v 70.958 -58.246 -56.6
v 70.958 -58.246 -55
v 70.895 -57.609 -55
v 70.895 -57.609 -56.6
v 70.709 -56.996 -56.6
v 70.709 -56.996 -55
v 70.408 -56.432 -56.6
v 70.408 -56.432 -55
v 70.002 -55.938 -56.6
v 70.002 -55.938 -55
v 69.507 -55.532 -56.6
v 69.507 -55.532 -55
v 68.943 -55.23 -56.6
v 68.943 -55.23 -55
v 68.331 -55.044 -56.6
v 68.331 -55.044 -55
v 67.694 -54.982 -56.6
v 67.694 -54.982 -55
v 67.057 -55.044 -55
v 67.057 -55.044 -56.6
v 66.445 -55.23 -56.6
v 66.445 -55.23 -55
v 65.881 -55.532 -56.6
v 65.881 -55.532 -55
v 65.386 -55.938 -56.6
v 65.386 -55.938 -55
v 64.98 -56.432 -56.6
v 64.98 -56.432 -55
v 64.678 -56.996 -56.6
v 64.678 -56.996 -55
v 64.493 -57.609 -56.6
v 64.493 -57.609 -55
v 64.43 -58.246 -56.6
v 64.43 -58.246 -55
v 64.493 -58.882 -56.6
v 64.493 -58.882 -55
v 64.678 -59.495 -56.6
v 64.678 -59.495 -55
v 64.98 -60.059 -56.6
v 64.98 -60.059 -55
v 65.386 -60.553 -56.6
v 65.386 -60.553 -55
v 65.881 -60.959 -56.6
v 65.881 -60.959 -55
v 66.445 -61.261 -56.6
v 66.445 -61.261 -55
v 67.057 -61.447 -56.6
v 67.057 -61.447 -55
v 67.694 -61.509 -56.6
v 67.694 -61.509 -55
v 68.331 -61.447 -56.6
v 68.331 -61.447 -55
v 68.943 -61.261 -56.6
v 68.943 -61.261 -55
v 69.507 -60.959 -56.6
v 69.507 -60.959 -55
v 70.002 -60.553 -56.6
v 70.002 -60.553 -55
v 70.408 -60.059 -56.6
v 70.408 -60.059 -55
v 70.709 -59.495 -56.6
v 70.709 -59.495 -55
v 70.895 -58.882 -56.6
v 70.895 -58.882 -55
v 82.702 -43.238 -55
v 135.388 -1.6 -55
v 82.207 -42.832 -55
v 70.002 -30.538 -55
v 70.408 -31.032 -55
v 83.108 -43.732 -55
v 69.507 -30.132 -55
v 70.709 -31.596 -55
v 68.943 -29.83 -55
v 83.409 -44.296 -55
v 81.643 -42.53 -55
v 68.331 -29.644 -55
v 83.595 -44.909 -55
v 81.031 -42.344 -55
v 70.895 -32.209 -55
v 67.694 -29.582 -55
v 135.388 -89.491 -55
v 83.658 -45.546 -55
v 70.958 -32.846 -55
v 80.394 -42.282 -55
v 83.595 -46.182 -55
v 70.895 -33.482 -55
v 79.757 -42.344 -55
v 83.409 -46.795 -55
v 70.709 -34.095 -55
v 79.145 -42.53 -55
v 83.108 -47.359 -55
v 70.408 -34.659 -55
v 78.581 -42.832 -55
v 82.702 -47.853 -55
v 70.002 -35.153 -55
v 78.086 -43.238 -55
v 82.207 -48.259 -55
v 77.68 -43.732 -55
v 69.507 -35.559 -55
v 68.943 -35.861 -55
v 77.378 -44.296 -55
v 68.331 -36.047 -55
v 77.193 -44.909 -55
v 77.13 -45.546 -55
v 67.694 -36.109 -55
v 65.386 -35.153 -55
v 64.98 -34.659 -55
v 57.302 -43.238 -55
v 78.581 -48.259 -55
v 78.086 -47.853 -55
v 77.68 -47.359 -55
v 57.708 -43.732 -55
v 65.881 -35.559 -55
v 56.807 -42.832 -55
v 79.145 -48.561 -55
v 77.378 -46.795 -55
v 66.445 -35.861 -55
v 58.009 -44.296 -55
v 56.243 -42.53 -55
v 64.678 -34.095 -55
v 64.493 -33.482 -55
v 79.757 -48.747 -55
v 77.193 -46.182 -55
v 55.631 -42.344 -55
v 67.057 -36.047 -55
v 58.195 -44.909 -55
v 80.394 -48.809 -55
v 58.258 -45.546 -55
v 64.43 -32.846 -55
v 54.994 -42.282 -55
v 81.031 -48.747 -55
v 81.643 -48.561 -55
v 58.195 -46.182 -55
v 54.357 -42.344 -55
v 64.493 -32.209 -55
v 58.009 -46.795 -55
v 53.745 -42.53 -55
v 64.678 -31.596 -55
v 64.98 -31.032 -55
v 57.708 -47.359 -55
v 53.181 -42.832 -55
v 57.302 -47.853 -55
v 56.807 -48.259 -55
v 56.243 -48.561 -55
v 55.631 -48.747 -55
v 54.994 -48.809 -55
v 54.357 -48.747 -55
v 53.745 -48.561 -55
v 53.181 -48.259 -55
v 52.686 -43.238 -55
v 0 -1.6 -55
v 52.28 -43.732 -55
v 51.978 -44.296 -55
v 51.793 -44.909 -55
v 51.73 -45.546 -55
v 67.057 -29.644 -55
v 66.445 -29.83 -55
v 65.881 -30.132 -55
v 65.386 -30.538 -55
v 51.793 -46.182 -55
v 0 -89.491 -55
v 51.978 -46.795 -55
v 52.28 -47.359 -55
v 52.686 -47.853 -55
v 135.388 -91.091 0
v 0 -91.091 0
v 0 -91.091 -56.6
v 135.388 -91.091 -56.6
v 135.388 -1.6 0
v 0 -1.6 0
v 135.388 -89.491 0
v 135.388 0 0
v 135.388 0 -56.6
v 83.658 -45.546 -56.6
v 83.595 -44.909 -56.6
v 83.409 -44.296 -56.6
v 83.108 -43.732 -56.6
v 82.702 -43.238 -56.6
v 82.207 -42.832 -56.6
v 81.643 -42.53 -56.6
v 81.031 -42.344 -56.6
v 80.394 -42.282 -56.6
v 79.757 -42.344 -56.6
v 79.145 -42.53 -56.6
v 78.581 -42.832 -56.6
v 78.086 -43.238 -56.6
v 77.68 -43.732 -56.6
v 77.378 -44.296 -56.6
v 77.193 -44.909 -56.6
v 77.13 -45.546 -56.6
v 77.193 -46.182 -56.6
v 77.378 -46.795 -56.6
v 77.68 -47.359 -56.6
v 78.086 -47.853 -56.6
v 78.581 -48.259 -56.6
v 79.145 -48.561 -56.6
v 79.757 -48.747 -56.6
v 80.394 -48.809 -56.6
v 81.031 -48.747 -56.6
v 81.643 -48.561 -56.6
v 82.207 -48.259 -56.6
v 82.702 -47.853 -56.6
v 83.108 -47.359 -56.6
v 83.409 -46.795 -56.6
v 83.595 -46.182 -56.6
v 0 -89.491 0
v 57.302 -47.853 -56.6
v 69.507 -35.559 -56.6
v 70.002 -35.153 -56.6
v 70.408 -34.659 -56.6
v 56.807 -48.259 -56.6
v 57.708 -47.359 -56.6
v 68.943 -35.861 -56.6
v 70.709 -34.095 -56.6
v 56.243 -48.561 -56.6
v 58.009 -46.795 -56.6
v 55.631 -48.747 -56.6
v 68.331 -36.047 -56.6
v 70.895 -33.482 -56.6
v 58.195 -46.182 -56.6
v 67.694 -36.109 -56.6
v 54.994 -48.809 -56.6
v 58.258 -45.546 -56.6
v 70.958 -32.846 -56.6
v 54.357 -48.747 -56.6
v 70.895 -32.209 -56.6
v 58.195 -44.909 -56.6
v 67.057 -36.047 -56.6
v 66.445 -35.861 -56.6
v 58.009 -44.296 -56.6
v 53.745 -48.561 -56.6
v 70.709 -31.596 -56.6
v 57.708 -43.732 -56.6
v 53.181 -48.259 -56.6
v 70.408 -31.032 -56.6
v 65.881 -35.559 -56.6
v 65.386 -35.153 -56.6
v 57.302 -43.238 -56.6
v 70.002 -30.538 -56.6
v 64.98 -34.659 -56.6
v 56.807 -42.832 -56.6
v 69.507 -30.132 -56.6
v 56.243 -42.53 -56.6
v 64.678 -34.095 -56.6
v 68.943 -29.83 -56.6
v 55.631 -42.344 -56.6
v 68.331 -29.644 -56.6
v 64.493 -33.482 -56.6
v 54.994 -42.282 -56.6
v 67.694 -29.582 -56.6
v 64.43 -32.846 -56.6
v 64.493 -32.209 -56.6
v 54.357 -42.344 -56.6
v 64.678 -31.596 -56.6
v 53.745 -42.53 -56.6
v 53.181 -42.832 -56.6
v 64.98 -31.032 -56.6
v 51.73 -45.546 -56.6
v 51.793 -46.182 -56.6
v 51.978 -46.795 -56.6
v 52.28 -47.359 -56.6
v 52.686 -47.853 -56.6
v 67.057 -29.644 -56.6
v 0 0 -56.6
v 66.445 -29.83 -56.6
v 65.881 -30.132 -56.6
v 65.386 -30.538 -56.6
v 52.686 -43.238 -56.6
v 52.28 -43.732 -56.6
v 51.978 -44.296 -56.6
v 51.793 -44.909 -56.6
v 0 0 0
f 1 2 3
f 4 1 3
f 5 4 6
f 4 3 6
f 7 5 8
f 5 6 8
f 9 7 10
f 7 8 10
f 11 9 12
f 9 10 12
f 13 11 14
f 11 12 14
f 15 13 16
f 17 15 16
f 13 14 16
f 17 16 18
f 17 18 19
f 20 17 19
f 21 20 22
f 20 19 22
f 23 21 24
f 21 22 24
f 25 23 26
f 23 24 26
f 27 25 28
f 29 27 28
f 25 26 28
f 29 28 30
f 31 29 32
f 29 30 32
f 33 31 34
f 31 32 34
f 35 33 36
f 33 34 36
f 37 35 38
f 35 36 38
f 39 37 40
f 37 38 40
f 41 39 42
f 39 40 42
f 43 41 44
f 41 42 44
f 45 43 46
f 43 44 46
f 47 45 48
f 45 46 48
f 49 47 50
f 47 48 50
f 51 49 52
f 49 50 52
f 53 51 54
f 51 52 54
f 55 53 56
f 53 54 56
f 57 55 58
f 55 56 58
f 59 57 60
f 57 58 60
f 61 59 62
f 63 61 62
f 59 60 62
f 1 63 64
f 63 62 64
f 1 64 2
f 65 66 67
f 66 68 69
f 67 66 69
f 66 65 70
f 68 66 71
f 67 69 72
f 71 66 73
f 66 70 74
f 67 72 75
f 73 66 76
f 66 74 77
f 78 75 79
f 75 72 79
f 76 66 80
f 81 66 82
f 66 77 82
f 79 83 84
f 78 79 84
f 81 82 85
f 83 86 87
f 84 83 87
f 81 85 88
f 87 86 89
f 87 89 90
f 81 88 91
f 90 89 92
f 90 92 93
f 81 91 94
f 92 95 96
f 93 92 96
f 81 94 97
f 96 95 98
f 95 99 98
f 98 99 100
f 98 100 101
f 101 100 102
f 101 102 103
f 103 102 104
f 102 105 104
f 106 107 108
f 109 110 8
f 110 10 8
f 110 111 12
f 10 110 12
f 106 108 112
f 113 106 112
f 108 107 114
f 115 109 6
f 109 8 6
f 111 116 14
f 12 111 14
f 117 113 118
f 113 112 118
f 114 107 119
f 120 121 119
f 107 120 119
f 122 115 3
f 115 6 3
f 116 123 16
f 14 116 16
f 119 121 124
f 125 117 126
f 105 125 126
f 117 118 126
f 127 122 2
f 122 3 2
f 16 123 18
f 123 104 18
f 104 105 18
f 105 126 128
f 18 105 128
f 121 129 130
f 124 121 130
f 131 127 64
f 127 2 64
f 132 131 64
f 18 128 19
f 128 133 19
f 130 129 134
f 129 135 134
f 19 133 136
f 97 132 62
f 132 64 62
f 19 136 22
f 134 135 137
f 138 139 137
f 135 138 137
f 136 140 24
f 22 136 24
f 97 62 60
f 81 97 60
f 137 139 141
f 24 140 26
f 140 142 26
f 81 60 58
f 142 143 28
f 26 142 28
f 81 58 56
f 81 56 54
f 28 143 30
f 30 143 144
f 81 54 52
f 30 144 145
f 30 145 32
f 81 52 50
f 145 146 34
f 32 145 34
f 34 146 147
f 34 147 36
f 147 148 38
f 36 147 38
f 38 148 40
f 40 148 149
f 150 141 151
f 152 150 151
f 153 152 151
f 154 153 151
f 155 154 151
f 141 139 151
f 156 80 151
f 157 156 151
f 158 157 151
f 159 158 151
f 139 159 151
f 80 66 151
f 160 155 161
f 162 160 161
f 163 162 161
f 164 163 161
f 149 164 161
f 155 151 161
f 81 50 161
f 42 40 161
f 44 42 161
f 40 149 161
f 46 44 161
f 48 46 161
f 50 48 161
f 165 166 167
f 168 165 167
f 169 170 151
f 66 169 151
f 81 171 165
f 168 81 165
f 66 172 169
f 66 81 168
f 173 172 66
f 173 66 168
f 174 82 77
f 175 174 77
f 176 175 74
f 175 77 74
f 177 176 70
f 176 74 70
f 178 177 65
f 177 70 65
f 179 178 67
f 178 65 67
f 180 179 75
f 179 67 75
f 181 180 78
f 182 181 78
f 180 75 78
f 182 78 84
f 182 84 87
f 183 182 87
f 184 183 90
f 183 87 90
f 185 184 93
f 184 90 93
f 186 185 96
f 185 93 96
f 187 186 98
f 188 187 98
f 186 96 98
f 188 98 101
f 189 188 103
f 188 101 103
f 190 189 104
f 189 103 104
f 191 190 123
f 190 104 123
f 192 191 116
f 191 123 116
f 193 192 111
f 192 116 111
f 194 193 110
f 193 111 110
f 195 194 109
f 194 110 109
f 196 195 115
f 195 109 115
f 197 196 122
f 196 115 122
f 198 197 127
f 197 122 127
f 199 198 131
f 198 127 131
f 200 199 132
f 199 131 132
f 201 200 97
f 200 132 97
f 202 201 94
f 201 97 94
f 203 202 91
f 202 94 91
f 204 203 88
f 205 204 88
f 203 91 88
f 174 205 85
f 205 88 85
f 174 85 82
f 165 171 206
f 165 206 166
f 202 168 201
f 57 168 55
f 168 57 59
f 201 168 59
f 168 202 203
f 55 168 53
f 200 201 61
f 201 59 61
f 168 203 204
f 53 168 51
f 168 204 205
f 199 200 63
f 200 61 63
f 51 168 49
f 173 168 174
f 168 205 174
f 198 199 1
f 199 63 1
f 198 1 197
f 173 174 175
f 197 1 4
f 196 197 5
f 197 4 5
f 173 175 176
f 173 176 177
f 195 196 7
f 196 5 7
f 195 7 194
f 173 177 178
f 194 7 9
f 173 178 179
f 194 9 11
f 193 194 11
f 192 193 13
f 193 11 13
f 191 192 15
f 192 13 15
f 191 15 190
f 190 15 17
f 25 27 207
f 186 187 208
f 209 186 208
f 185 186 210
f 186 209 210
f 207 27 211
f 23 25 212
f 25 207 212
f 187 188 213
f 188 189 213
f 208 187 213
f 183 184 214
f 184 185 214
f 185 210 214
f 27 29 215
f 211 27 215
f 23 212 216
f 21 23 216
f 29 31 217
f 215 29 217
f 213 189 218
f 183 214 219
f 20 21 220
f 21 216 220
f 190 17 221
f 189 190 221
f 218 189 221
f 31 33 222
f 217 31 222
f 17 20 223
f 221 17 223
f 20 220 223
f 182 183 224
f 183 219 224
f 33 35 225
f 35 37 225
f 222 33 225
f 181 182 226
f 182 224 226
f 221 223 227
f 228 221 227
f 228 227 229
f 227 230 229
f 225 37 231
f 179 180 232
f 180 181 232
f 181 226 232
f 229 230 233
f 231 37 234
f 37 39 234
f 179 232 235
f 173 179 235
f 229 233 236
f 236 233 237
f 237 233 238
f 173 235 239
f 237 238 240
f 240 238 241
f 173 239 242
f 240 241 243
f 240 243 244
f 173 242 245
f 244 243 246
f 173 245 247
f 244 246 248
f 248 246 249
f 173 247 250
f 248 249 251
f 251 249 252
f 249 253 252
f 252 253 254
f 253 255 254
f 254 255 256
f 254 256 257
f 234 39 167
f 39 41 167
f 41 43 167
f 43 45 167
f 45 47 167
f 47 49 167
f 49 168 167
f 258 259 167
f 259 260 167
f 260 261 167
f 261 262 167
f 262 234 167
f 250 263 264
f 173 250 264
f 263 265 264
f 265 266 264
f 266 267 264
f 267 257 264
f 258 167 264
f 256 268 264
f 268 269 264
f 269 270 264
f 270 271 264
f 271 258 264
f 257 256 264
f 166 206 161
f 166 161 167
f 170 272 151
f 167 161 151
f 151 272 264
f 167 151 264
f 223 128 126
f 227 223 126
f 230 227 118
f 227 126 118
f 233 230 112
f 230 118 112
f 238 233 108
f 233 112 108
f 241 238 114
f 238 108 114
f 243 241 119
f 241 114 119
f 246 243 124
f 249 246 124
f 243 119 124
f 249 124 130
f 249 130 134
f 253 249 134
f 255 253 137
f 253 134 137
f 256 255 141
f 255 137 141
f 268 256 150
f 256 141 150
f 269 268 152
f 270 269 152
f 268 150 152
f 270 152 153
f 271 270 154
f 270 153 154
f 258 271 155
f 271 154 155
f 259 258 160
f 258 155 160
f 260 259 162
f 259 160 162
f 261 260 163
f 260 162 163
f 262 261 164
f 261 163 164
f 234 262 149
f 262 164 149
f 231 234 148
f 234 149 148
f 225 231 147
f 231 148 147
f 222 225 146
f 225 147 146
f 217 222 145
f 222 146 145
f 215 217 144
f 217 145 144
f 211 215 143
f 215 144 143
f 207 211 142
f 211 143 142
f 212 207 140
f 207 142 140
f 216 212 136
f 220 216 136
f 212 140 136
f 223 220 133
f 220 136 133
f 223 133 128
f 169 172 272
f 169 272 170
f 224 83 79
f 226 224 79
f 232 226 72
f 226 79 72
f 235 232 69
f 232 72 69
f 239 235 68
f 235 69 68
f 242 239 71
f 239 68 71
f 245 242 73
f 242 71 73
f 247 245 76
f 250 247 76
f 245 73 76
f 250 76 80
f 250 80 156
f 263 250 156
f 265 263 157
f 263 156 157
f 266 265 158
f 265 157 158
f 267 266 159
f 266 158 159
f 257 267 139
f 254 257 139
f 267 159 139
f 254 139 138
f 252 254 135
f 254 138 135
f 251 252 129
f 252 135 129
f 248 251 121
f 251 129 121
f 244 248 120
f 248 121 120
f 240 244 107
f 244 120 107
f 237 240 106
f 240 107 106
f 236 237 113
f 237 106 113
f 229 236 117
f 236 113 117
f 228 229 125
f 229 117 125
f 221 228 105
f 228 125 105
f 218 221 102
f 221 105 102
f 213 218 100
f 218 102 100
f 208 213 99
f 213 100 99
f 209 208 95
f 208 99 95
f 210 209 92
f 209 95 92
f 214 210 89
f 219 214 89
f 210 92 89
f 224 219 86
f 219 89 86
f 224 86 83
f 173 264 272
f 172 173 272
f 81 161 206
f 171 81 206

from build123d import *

# Parameters (mm, degrees)
BOSS_EXTRUDE1_DEPTH = 135.3879
SKETCH2_R           = 3.2639
CUT_EXTRUDE1_DEPTH  = 1.6002


with BuildPart() as part:
    # Sketch1 → Boss-Extrude1 (new body)
    with BuildSketch(Plane(origin=(0, 0, 0), x_dir=(0, 0, -1), z_dir=(1, 0, 0))):
        Polygon((0, 0), (0, -1.6002), (55, -1.6002), (55, -89.49088), (0, -89.49088), (0, -91.09108), (56.6002, -91.09108), (56.6002, 0), align=None)
    extrude(amount=BOSS_EXTRUDE1_DEPTH)

    # Sketch2 → Cut-Extrude1 (cut)
    with BuildSketch(Plane.XY.offset(-55)):
        with Locations((67.69395, -32.84554)):
            Circle(SKETCH2_R)
        with Locations((67.69395, -58.24554)):
            Circle(SKETCH2_R)
        with Locations((54.99395, -45.54554)):
            Circle(SKETCH2_R)
        with Locations((80.39395, -45.54554)):
            Circle(SKETCH2_R)
    extrude(amount=-CUT_EXTRUDE1_DEPTH, mode=Mode.SUBTRACT)


solid = part.part
